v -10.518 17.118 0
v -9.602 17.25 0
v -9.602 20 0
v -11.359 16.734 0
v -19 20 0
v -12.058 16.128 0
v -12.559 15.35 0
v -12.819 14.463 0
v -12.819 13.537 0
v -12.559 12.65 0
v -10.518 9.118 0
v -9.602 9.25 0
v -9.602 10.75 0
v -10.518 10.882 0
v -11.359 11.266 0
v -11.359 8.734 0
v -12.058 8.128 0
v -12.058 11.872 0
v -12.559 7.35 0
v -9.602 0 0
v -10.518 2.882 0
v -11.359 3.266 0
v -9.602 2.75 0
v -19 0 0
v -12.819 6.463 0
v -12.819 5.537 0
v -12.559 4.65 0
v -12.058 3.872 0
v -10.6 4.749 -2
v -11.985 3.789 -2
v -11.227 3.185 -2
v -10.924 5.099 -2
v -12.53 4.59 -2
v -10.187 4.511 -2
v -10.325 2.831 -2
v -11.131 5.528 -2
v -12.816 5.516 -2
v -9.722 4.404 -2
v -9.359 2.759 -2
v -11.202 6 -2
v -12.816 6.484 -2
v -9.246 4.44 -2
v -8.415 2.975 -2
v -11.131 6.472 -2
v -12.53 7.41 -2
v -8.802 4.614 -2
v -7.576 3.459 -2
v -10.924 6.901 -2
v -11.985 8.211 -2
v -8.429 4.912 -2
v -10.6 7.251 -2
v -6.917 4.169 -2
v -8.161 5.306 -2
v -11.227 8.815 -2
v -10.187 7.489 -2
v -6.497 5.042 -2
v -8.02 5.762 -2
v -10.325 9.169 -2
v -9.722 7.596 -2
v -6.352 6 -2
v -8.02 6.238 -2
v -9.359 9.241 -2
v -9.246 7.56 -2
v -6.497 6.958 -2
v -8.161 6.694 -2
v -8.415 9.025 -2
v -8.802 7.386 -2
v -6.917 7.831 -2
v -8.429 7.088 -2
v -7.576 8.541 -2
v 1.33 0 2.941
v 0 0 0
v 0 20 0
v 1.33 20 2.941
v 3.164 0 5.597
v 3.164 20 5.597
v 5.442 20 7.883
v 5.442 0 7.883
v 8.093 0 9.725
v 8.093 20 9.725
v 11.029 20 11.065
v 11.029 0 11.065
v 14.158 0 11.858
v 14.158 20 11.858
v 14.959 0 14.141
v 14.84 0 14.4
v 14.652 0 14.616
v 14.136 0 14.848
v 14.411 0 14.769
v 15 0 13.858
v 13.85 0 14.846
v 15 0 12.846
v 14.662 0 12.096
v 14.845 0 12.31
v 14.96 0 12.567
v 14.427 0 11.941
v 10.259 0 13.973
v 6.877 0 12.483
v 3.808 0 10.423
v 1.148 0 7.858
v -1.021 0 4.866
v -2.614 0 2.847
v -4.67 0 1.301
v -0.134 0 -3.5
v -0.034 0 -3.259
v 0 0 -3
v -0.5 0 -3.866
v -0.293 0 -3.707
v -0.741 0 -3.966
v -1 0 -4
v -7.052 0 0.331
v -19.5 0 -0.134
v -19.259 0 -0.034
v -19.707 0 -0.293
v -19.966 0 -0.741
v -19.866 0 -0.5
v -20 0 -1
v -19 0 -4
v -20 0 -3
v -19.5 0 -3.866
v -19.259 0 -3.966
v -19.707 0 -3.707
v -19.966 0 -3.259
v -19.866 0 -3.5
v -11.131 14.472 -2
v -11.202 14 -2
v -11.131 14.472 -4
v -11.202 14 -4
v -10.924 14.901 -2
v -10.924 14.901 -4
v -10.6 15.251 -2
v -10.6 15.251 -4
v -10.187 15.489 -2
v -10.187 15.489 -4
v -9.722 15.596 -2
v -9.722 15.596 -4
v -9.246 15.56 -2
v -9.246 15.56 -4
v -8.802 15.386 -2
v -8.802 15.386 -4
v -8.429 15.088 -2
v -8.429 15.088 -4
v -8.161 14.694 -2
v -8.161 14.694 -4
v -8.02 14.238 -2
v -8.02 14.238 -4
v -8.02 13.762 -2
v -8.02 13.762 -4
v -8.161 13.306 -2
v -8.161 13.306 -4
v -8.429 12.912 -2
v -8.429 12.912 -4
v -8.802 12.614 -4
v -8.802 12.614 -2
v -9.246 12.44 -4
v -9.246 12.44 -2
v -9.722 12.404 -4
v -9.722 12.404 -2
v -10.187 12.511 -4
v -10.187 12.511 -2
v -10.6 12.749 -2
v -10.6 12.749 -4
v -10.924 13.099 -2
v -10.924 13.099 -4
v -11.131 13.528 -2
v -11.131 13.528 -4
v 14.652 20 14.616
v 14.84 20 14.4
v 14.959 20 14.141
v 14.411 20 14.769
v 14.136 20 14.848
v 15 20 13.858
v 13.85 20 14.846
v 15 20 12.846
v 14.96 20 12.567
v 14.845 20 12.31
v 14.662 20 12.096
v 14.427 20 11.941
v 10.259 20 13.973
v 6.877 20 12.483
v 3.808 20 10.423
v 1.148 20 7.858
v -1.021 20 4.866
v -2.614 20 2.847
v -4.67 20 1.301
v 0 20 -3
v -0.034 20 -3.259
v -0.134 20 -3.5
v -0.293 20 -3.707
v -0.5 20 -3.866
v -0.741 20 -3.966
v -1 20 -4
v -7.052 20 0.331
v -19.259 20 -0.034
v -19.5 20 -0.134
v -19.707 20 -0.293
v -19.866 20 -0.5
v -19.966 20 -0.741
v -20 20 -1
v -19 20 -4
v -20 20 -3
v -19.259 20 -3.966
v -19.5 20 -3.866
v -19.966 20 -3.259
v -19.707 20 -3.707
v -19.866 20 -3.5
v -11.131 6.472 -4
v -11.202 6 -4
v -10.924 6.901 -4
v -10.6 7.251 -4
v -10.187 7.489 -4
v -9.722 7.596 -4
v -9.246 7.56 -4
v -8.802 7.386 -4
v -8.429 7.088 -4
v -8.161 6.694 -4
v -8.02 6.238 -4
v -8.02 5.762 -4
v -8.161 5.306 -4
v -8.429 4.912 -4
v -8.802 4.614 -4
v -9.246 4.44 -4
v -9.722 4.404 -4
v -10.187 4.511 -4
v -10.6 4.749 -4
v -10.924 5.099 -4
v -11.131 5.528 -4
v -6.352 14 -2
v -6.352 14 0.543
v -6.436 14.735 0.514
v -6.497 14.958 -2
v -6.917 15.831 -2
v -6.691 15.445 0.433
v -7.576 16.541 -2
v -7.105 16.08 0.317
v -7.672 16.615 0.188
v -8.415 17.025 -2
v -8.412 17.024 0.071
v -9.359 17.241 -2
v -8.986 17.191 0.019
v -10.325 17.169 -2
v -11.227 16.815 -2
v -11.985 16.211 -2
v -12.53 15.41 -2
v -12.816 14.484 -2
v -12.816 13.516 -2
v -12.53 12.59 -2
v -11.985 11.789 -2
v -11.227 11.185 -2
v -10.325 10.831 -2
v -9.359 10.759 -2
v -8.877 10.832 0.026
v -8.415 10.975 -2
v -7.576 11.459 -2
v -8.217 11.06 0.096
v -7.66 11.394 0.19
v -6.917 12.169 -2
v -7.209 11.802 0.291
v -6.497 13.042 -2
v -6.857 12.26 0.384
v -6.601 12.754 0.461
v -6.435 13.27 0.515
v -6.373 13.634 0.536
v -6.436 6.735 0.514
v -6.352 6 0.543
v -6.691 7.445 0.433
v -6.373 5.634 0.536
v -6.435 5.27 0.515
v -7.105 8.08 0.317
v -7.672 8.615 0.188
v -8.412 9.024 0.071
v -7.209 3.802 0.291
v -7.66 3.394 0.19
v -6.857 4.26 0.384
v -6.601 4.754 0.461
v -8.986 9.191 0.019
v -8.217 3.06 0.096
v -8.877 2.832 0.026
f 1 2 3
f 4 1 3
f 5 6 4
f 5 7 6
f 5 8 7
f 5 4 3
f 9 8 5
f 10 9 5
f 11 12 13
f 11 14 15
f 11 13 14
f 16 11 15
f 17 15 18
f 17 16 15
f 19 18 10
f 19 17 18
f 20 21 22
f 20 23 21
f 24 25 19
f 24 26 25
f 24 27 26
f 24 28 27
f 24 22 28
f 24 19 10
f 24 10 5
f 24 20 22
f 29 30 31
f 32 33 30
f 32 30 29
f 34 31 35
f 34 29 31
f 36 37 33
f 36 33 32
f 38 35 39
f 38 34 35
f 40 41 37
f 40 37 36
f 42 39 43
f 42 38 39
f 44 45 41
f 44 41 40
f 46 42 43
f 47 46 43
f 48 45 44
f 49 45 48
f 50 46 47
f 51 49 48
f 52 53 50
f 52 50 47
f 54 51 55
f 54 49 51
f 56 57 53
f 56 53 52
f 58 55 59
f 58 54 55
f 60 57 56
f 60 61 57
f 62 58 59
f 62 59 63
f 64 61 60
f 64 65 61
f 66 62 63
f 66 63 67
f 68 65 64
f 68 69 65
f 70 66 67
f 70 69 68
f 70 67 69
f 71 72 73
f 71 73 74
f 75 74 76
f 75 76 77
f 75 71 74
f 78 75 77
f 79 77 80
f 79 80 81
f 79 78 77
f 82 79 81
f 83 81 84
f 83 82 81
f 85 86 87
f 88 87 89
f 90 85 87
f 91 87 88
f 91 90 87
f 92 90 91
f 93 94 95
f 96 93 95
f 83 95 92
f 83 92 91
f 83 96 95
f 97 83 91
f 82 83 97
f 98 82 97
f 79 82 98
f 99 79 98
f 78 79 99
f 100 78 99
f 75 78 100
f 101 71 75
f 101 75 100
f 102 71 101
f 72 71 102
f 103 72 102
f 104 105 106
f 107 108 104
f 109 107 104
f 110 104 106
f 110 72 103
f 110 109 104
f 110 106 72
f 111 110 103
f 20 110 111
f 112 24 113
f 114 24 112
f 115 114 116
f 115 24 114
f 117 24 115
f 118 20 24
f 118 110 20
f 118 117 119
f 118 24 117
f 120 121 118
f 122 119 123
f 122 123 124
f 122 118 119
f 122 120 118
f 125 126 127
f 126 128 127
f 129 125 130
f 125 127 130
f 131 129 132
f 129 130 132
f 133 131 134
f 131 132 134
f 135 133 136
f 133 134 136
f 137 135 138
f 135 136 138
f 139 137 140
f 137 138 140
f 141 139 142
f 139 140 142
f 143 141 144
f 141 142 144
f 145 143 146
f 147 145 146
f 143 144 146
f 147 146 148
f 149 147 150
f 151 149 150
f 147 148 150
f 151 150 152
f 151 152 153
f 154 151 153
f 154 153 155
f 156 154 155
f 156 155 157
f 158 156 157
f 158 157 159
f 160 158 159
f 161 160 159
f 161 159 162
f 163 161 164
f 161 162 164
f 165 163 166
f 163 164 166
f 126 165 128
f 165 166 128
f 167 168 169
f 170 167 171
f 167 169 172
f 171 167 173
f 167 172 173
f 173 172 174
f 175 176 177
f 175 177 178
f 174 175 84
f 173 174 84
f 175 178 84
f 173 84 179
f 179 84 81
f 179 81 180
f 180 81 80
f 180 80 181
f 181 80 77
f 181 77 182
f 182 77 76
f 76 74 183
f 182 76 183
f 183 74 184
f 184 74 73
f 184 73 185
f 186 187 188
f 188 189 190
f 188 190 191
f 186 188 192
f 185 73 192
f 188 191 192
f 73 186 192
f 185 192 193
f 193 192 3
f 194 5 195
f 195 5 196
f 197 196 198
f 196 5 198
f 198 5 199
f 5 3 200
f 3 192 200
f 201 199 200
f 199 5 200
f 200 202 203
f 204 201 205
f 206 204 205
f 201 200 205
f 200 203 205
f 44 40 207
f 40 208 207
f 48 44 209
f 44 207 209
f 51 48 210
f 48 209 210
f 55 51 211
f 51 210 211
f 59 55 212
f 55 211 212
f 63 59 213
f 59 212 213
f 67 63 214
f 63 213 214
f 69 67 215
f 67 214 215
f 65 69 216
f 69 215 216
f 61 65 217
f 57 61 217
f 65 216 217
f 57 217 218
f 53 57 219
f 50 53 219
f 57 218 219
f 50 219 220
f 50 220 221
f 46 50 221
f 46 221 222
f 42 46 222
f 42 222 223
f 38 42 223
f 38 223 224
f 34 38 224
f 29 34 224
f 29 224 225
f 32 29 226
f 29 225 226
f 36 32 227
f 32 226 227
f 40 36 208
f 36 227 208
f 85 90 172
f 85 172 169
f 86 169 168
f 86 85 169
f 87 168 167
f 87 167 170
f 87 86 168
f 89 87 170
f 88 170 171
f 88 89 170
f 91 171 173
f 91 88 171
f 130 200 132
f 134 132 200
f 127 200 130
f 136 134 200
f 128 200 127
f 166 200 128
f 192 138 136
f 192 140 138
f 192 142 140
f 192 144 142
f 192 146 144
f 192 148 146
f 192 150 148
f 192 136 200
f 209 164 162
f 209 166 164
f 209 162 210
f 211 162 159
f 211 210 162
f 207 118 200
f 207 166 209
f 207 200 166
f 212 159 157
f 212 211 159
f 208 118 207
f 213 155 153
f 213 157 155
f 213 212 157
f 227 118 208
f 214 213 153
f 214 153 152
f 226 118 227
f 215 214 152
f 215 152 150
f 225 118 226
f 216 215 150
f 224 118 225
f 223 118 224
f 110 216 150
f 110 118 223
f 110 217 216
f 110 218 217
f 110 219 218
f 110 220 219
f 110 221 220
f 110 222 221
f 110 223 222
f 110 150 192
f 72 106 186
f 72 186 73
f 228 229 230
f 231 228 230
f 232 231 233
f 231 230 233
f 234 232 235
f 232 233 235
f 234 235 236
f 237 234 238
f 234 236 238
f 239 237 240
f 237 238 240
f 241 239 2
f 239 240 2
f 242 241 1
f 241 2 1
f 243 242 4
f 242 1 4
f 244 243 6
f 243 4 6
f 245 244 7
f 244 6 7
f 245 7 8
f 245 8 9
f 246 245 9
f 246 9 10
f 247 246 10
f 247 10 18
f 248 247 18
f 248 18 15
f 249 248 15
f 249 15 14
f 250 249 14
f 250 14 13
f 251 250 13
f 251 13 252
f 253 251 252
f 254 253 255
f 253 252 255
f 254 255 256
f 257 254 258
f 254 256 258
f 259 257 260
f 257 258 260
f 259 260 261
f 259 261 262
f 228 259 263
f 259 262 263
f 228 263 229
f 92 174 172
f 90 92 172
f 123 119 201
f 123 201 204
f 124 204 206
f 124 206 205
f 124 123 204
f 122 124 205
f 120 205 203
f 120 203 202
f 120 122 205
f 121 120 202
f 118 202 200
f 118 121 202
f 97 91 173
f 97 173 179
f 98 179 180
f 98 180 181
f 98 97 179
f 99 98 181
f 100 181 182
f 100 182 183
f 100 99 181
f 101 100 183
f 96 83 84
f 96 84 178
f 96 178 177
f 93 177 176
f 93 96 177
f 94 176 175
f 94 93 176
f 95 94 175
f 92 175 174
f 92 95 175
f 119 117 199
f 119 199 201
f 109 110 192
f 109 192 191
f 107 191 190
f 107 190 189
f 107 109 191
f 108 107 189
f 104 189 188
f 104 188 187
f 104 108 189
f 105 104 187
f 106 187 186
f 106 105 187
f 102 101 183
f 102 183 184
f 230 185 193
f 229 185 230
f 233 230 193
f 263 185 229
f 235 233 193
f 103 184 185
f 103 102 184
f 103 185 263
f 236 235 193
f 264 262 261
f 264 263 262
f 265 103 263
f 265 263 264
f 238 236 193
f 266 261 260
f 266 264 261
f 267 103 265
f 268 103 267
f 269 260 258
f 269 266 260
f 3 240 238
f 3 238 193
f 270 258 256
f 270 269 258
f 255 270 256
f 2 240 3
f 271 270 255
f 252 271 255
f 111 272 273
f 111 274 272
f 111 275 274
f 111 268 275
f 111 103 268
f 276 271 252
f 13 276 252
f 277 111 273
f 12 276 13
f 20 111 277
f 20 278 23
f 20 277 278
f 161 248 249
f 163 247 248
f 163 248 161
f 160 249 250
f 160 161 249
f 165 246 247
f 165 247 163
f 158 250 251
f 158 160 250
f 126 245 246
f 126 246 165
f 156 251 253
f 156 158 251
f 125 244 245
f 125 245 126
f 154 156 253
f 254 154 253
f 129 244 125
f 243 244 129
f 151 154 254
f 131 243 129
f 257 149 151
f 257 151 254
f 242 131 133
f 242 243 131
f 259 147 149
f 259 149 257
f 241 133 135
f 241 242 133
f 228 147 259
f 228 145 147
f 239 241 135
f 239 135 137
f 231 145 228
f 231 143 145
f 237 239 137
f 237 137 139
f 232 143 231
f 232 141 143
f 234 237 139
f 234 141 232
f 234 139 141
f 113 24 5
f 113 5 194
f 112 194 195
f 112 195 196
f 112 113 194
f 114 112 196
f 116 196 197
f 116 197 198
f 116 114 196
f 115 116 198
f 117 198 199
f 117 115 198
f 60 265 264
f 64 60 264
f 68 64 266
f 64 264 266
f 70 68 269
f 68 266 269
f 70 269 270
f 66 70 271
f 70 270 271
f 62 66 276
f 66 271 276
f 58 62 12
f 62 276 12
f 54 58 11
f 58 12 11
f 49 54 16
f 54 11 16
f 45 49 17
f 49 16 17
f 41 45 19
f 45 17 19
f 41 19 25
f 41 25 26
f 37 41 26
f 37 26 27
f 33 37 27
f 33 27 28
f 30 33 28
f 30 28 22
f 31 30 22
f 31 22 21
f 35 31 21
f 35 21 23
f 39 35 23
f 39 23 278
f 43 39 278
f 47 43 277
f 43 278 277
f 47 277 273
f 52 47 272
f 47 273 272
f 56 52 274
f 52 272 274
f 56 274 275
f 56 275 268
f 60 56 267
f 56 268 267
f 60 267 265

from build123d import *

# Parameters (mm, degrees)
BOSS_EXTRUDE1_DEPTH            = 20
CBORE_FOR_M3_SHCS2_D           = 3.2
CBORE_FOR_M3_SHCS2_CBORE_D     = 6.5
CBORE_FOR_M3_SHCS2_CBORE_DEPTH = 4


with BuildPart() as part:
    # Sketch1 → Boss-Extrude1 (new body)
    with BuildSketch(Plane(origin=(0, 0, 0), x_dir=(1, 0, 0), z_dir=(0, 1, 0))):
        with BuildLine():
            Line((15, -12.845583256), (15, -13.85764015))
            ThreePointArc((15, -13.85764015), (14.651920241, -14.615927695), (13.85, -14.846326147))
            ThreePointArc((13.85, -14.846326147), (5.297257748, -11.520830029), (-1.020862471, -4.865780715))
            ThreePointArc((-1.020862471, -4.865780715), (-4.669791713, -1.30108648), (-9.602225552, 0))
            Line((-9.602225552, 0), (-19, 0))
            ThreePointArc((-19, 0), (-19.707106781, 0.292893219), (-20, 1))
            Line((-20, 1), (-20, 3))
            ThreePointArc((-20, 3), (-19.707106781, 3.707106781), (-19, 4))
            Line((-19, 4), (-1, 4))
            ThreePointArc((-1, 4), (-0.292893219, 3.707106781), (0, 3))
            Line((0, 3), (0, 0))
            ThreePointArc((0, 0), (5.442271801, -7.883156387), (14.157894737, -11.858127307))
            ThreePointArc((14.157894737, -11.858127307), (14.76088591, -12.196697572), (15, -12.845583256))
        make_face()
    extrude(amount=BOSS_EXTRUDE1_DEPTH)

    # CBORE for M3 SHCS2 (through all)
    with Locations(Plane.XY.offset(2)):
        with Locations((-9.602225552, 14), (-9.602225552, 6)):
            CounterBoreHole(CBORE_FOR_M3_SHCS2_D / 2, CBORE_FOR_M3_SHCS2_CBORE_D / 2, CBORE_FOR_M3_SHCS2_CBORE_DEPTH)


solid = part.part
